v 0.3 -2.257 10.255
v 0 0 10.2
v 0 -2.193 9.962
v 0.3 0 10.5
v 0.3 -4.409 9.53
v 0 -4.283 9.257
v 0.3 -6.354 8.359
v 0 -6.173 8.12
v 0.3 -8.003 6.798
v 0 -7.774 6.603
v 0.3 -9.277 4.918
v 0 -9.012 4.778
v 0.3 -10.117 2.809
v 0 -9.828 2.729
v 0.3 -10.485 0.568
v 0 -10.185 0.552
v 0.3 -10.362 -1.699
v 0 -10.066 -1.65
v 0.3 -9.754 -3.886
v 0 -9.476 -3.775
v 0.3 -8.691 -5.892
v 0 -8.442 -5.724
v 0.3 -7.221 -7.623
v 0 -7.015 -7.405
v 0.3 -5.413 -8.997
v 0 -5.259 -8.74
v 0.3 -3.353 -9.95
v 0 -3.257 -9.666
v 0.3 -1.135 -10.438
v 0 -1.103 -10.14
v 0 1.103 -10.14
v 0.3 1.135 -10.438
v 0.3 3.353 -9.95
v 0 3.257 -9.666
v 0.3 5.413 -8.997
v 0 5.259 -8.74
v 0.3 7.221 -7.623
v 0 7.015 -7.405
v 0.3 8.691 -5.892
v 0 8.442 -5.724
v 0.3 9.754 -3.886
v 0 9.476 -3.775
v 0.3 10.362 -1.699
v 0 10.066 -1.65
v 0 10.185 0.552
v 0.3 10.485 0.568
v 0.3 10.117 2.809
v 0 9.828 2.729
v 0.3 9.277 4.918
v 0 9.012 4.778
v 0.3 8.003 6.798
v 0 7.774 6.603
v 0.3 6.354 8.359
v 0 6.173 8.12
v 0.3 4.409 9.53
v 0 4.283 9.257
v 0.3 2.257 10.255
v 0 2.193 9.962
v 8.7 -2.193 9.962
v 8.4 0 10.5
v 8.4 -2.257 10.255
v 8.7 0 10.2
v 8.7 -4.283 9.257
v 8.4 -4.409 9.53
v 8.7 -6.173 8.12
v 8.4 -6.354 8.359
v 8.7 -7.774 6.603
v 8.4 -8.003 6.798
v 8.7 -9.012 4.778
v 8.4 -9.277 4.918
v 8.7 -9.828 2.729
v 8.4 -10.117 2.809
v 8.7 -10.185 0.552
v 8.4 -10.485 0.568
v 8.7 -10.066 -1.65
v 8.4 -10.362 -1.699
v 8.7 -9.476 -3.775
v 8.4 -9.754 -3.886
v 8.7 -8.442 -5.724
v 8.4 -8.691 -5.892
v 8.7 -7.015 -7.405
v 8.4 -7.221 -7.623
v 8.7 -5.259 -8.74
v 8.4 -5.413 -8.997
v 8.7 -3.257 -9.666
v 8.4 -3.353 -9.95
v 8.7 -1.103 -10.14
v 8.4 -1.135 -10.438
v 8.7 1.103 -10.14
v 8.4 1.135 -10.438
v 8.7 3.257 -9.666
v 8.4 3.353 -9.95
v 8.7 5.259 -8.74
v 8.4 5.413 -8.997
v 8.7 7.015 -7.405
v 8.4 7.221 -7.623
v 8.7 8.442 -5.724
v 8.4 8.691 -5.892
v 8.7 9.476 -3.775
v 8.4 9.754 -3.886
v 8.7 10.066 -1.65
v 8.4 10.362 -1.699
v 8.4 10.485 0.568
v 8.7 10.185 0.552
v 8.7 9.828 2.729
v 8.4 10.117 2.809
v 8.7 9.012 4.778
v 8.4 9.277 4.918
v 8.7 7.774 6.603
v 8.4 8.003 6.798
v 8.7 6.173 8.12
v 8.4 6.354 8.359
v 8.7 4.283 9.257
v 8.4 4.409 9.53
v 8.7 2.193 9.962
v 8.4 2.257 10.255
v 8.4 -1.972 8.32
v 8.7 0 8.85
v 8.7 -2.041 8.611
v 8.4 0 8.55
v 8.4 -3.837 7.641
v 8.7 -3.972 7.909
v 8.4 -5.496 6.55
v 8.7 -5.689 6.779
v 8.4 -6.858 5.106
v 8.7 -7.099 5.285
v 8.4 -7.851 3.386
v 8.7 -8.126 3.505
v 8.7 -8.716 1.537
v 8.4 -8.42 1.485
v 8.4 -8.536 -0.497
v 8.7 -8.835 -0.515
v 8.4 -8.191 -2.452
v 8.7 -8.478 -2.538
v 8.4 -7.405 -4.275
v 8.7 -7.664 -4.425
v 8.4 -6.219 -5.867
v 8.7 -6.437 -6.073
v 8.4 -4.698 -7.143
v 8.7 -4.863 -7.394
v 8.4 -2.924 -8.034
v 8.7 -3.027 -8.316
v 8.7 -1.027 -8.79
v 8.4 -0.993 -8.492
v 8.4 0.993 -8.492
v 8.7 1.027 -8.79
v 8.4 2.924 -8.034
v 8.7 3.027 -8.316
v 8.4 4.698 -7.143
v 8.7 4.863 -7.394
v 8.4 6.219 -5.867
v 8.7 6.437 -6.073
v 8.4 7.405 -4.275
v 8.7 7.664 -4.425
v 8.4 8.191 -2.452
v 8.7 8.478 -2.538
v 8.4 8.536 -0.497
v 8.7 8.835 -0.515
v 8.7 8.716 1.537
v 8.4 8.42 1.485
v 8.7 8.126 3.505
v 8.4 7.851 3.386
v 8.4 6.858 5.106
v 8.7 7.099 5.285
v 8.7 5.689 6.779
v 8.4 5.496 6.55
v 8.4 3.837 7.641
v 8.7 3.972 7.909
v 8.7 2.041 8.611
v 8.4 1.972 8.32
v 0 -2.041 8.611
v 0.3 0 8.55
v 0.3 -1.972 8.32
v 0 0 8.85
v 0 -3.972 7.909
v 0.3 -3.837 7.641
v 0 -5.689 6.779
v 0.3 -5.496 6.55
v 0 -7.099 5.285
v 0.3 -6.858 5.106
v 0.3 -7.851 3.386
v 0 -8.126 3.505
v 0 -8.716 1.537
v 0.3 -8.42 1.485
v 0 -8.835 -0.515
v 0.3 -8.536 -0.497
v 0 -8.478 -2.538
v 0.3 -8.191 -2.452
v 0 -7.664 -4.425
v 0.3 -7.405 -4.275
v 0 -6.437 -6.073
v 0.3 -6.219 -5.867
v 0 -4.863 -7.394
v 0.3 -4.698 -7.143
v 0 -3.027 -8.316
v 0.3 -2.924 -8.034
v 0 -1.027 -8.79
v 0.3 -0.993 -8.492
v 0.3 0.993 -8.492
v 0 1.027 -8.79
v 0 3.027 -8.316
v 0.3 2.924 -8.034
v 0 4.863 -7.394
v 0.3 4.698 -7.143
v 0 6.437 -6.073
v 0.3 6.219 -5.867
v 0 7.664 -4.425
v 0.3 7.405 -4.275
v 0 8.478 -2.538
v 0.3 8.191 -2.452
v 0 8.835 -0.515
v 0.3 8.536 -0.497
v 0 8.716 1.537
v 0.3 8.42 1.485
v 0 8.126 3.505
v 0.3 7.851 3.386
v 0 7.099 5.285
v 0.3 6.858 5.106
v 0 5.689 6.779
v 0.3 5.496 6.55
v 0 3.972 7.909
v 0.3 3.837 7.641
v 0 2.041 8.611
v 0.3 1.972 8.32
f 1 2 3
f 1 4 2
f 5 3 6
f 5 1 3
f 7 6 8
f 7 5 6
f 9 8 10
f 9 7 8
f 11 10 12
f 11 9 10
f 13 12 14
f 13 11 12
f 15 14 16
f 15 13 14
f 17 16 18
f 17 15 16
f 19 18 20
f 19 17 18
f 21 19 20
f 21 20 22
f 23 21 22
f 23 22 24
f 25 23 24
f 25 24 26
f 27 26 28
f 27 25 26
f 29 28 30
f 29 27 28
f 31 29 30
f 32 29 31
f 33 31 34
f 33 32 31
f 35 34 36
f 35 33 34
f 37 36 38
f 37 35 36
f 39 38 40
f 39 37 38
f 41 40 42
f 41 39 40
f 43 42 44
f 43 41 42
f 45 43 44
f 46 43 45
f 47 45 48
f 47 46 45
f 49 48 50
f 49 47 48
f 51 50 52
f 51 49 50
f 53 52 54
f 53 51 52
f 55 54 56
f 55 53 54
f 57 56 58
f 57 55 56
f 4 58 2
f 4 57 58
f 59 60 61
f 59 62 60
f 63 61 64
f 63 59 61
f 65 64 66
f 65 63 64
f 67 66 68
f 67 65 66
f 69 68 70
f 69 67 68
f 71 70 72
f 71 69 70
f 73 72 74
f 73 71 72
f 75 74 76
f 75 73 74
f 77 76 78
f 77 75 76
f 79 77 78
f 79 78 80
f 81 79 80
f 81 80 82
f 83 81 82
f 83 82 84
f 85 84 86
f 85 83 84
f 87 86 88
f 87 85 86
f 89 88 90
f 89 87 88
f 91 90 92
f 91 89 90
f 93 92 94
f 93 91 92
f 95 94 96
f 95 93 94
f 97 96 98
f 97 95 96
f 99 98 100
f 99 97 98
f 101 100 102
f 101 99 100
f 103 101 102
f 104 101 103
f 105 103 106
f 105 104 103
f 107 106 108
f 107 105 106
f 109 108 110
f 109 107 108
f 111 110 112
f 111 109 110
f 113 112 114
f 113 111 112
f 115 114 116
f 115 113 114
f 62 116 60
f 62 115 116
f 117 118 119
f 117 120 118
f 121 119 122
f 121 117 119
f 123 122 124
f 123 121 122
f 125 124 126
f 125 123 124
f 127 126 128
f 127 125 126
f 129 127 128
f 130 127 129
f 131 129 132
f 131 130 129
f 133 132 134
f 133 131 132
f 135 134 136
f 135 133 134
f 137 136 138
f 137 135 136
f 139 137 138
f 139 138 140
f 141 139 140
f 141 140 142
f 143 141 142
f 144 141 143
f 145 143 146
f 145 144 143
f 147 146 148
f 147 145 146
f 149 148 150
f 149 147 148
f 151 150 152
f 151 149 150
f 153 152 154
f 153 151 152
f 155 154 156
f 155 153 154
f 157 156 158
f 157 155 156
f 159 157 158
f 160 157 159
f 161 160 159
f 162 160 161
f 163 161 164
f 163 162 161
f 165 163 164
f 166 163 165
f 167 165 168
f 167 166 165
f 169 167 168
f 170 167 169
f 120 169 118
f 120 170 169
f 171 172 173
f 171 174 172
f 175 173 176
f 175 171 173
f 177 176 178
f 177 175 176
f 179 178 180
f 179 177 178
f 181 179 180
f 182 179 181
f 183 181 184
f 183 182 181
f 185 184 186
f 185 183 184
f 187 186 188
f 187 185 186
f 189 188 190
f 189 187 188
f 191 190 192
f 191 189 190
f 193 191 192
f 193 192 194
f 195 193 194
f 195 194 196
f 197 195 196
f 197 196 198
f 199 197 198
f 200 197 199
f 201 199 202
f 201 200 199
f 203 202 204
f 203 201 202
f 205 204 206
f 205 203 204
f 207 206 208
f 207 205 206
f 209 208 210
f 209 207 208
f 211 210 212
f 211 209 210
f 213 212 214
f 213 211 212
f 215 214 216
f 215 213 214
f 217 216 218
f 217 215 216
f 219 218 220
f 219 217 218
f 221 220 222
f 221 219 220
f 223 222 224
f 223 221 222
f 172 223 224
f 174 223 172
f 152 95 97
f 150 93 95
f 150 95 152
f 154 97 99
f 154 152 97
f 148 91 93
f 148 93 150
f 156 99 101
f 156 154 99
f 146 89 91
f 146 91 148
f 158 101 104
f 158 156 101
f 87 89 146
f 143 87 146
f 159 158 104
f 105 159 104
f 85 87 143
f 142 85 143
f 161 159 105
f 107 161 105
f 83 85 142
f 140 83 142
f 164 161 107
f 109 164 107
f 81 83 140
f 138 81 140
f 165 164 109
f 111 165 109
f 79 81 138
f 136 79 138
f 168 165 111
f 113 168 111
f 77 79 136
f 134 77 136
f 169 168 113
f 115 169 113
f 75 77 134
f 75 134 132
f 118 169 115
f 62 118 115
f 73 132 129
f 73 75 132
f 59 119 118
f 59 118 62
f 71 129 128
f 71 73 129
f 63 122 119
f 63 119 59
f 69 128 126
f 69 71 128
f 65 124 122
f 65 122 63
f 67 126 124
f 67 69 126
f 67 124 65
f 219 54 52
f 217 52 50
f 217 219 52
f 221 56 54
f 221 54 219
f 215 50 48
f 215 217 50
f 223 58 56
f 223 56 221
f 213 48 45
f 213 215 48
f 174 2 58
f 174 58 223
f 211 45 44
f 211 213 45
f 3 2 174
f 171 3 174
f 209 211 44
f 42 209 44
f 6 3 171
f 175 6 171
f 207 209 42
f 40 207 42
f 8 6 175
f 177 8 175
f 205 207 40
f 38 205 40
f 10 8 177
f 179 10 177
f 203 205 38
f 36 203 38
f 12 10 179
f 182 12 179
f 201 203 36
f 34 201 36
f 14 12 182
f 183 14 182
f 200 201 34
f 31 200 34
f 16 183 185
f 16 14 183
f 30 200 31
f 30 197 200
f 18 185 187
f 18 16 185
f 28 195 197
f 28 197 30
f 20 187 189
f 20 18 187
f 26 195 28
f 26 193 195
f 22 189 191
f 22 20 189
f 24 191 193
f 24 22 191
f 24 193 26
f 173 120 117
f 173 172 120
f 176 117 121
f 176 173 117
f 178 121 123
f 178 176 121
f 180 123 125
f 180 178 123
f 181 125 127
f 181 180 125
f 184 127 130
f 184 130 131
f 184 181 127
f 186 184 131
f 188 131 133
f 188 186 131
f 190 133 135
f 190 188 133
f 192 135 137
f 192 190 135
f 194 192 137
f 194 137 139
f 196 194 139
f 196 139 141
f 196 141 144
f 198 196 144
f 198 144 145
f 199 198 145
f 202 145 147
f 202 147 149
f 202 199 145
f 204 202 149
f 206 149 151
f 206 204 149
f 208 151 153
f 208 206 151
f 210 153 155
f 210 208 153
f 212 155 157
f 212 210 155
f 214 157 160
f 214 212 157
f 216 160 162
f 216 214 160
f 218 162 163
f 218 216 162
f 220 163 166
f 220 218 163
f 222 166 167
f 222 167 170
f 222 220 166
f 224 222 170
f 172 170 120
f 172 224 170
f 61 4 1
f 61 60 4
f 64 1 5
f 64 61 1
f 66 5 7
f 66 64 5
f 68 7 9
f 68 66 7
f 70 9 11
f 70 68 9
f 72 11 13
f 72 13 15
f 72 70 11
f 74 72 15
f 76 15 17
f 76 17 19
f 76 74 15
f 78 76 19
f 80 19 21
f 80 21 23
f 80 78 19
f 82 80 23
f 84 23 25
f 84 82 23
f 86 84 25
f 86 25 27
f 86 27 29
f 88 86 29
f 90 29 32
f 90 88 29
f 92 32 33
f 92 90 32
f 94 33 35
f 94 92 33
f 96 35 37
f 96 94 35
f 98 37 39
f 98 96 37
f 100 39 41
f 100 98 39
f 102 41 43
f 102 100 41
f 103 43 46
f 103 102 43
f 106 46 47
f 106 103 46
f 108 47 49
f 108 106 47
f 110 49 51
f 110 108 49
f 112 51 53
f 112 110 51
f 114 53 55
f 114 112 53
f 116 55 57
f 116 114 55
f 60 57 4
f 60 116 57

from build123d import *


with BuildPart() as part:
    # Skizze1 → Rotation1 (revolve)
    with BuildSketch(Plane.XY, mode=Mode.PRIVATE) as rotation1_sk:
        Polygon((8.4, 10.5), (8.7, 10.2), (8.7, 8.85), (8.4, 8.55), (0.3, 8.55), (0, 8.85), (0, 10.2), (0.3, 10.5), align=None)
    revolve(rotation1_sk.sketch.rotate(Axis((0, 0, 0), (1, 0, 0)), 90), axis=Axis((0, 0, 0), (1, 0, 0)))


solid = part.part
